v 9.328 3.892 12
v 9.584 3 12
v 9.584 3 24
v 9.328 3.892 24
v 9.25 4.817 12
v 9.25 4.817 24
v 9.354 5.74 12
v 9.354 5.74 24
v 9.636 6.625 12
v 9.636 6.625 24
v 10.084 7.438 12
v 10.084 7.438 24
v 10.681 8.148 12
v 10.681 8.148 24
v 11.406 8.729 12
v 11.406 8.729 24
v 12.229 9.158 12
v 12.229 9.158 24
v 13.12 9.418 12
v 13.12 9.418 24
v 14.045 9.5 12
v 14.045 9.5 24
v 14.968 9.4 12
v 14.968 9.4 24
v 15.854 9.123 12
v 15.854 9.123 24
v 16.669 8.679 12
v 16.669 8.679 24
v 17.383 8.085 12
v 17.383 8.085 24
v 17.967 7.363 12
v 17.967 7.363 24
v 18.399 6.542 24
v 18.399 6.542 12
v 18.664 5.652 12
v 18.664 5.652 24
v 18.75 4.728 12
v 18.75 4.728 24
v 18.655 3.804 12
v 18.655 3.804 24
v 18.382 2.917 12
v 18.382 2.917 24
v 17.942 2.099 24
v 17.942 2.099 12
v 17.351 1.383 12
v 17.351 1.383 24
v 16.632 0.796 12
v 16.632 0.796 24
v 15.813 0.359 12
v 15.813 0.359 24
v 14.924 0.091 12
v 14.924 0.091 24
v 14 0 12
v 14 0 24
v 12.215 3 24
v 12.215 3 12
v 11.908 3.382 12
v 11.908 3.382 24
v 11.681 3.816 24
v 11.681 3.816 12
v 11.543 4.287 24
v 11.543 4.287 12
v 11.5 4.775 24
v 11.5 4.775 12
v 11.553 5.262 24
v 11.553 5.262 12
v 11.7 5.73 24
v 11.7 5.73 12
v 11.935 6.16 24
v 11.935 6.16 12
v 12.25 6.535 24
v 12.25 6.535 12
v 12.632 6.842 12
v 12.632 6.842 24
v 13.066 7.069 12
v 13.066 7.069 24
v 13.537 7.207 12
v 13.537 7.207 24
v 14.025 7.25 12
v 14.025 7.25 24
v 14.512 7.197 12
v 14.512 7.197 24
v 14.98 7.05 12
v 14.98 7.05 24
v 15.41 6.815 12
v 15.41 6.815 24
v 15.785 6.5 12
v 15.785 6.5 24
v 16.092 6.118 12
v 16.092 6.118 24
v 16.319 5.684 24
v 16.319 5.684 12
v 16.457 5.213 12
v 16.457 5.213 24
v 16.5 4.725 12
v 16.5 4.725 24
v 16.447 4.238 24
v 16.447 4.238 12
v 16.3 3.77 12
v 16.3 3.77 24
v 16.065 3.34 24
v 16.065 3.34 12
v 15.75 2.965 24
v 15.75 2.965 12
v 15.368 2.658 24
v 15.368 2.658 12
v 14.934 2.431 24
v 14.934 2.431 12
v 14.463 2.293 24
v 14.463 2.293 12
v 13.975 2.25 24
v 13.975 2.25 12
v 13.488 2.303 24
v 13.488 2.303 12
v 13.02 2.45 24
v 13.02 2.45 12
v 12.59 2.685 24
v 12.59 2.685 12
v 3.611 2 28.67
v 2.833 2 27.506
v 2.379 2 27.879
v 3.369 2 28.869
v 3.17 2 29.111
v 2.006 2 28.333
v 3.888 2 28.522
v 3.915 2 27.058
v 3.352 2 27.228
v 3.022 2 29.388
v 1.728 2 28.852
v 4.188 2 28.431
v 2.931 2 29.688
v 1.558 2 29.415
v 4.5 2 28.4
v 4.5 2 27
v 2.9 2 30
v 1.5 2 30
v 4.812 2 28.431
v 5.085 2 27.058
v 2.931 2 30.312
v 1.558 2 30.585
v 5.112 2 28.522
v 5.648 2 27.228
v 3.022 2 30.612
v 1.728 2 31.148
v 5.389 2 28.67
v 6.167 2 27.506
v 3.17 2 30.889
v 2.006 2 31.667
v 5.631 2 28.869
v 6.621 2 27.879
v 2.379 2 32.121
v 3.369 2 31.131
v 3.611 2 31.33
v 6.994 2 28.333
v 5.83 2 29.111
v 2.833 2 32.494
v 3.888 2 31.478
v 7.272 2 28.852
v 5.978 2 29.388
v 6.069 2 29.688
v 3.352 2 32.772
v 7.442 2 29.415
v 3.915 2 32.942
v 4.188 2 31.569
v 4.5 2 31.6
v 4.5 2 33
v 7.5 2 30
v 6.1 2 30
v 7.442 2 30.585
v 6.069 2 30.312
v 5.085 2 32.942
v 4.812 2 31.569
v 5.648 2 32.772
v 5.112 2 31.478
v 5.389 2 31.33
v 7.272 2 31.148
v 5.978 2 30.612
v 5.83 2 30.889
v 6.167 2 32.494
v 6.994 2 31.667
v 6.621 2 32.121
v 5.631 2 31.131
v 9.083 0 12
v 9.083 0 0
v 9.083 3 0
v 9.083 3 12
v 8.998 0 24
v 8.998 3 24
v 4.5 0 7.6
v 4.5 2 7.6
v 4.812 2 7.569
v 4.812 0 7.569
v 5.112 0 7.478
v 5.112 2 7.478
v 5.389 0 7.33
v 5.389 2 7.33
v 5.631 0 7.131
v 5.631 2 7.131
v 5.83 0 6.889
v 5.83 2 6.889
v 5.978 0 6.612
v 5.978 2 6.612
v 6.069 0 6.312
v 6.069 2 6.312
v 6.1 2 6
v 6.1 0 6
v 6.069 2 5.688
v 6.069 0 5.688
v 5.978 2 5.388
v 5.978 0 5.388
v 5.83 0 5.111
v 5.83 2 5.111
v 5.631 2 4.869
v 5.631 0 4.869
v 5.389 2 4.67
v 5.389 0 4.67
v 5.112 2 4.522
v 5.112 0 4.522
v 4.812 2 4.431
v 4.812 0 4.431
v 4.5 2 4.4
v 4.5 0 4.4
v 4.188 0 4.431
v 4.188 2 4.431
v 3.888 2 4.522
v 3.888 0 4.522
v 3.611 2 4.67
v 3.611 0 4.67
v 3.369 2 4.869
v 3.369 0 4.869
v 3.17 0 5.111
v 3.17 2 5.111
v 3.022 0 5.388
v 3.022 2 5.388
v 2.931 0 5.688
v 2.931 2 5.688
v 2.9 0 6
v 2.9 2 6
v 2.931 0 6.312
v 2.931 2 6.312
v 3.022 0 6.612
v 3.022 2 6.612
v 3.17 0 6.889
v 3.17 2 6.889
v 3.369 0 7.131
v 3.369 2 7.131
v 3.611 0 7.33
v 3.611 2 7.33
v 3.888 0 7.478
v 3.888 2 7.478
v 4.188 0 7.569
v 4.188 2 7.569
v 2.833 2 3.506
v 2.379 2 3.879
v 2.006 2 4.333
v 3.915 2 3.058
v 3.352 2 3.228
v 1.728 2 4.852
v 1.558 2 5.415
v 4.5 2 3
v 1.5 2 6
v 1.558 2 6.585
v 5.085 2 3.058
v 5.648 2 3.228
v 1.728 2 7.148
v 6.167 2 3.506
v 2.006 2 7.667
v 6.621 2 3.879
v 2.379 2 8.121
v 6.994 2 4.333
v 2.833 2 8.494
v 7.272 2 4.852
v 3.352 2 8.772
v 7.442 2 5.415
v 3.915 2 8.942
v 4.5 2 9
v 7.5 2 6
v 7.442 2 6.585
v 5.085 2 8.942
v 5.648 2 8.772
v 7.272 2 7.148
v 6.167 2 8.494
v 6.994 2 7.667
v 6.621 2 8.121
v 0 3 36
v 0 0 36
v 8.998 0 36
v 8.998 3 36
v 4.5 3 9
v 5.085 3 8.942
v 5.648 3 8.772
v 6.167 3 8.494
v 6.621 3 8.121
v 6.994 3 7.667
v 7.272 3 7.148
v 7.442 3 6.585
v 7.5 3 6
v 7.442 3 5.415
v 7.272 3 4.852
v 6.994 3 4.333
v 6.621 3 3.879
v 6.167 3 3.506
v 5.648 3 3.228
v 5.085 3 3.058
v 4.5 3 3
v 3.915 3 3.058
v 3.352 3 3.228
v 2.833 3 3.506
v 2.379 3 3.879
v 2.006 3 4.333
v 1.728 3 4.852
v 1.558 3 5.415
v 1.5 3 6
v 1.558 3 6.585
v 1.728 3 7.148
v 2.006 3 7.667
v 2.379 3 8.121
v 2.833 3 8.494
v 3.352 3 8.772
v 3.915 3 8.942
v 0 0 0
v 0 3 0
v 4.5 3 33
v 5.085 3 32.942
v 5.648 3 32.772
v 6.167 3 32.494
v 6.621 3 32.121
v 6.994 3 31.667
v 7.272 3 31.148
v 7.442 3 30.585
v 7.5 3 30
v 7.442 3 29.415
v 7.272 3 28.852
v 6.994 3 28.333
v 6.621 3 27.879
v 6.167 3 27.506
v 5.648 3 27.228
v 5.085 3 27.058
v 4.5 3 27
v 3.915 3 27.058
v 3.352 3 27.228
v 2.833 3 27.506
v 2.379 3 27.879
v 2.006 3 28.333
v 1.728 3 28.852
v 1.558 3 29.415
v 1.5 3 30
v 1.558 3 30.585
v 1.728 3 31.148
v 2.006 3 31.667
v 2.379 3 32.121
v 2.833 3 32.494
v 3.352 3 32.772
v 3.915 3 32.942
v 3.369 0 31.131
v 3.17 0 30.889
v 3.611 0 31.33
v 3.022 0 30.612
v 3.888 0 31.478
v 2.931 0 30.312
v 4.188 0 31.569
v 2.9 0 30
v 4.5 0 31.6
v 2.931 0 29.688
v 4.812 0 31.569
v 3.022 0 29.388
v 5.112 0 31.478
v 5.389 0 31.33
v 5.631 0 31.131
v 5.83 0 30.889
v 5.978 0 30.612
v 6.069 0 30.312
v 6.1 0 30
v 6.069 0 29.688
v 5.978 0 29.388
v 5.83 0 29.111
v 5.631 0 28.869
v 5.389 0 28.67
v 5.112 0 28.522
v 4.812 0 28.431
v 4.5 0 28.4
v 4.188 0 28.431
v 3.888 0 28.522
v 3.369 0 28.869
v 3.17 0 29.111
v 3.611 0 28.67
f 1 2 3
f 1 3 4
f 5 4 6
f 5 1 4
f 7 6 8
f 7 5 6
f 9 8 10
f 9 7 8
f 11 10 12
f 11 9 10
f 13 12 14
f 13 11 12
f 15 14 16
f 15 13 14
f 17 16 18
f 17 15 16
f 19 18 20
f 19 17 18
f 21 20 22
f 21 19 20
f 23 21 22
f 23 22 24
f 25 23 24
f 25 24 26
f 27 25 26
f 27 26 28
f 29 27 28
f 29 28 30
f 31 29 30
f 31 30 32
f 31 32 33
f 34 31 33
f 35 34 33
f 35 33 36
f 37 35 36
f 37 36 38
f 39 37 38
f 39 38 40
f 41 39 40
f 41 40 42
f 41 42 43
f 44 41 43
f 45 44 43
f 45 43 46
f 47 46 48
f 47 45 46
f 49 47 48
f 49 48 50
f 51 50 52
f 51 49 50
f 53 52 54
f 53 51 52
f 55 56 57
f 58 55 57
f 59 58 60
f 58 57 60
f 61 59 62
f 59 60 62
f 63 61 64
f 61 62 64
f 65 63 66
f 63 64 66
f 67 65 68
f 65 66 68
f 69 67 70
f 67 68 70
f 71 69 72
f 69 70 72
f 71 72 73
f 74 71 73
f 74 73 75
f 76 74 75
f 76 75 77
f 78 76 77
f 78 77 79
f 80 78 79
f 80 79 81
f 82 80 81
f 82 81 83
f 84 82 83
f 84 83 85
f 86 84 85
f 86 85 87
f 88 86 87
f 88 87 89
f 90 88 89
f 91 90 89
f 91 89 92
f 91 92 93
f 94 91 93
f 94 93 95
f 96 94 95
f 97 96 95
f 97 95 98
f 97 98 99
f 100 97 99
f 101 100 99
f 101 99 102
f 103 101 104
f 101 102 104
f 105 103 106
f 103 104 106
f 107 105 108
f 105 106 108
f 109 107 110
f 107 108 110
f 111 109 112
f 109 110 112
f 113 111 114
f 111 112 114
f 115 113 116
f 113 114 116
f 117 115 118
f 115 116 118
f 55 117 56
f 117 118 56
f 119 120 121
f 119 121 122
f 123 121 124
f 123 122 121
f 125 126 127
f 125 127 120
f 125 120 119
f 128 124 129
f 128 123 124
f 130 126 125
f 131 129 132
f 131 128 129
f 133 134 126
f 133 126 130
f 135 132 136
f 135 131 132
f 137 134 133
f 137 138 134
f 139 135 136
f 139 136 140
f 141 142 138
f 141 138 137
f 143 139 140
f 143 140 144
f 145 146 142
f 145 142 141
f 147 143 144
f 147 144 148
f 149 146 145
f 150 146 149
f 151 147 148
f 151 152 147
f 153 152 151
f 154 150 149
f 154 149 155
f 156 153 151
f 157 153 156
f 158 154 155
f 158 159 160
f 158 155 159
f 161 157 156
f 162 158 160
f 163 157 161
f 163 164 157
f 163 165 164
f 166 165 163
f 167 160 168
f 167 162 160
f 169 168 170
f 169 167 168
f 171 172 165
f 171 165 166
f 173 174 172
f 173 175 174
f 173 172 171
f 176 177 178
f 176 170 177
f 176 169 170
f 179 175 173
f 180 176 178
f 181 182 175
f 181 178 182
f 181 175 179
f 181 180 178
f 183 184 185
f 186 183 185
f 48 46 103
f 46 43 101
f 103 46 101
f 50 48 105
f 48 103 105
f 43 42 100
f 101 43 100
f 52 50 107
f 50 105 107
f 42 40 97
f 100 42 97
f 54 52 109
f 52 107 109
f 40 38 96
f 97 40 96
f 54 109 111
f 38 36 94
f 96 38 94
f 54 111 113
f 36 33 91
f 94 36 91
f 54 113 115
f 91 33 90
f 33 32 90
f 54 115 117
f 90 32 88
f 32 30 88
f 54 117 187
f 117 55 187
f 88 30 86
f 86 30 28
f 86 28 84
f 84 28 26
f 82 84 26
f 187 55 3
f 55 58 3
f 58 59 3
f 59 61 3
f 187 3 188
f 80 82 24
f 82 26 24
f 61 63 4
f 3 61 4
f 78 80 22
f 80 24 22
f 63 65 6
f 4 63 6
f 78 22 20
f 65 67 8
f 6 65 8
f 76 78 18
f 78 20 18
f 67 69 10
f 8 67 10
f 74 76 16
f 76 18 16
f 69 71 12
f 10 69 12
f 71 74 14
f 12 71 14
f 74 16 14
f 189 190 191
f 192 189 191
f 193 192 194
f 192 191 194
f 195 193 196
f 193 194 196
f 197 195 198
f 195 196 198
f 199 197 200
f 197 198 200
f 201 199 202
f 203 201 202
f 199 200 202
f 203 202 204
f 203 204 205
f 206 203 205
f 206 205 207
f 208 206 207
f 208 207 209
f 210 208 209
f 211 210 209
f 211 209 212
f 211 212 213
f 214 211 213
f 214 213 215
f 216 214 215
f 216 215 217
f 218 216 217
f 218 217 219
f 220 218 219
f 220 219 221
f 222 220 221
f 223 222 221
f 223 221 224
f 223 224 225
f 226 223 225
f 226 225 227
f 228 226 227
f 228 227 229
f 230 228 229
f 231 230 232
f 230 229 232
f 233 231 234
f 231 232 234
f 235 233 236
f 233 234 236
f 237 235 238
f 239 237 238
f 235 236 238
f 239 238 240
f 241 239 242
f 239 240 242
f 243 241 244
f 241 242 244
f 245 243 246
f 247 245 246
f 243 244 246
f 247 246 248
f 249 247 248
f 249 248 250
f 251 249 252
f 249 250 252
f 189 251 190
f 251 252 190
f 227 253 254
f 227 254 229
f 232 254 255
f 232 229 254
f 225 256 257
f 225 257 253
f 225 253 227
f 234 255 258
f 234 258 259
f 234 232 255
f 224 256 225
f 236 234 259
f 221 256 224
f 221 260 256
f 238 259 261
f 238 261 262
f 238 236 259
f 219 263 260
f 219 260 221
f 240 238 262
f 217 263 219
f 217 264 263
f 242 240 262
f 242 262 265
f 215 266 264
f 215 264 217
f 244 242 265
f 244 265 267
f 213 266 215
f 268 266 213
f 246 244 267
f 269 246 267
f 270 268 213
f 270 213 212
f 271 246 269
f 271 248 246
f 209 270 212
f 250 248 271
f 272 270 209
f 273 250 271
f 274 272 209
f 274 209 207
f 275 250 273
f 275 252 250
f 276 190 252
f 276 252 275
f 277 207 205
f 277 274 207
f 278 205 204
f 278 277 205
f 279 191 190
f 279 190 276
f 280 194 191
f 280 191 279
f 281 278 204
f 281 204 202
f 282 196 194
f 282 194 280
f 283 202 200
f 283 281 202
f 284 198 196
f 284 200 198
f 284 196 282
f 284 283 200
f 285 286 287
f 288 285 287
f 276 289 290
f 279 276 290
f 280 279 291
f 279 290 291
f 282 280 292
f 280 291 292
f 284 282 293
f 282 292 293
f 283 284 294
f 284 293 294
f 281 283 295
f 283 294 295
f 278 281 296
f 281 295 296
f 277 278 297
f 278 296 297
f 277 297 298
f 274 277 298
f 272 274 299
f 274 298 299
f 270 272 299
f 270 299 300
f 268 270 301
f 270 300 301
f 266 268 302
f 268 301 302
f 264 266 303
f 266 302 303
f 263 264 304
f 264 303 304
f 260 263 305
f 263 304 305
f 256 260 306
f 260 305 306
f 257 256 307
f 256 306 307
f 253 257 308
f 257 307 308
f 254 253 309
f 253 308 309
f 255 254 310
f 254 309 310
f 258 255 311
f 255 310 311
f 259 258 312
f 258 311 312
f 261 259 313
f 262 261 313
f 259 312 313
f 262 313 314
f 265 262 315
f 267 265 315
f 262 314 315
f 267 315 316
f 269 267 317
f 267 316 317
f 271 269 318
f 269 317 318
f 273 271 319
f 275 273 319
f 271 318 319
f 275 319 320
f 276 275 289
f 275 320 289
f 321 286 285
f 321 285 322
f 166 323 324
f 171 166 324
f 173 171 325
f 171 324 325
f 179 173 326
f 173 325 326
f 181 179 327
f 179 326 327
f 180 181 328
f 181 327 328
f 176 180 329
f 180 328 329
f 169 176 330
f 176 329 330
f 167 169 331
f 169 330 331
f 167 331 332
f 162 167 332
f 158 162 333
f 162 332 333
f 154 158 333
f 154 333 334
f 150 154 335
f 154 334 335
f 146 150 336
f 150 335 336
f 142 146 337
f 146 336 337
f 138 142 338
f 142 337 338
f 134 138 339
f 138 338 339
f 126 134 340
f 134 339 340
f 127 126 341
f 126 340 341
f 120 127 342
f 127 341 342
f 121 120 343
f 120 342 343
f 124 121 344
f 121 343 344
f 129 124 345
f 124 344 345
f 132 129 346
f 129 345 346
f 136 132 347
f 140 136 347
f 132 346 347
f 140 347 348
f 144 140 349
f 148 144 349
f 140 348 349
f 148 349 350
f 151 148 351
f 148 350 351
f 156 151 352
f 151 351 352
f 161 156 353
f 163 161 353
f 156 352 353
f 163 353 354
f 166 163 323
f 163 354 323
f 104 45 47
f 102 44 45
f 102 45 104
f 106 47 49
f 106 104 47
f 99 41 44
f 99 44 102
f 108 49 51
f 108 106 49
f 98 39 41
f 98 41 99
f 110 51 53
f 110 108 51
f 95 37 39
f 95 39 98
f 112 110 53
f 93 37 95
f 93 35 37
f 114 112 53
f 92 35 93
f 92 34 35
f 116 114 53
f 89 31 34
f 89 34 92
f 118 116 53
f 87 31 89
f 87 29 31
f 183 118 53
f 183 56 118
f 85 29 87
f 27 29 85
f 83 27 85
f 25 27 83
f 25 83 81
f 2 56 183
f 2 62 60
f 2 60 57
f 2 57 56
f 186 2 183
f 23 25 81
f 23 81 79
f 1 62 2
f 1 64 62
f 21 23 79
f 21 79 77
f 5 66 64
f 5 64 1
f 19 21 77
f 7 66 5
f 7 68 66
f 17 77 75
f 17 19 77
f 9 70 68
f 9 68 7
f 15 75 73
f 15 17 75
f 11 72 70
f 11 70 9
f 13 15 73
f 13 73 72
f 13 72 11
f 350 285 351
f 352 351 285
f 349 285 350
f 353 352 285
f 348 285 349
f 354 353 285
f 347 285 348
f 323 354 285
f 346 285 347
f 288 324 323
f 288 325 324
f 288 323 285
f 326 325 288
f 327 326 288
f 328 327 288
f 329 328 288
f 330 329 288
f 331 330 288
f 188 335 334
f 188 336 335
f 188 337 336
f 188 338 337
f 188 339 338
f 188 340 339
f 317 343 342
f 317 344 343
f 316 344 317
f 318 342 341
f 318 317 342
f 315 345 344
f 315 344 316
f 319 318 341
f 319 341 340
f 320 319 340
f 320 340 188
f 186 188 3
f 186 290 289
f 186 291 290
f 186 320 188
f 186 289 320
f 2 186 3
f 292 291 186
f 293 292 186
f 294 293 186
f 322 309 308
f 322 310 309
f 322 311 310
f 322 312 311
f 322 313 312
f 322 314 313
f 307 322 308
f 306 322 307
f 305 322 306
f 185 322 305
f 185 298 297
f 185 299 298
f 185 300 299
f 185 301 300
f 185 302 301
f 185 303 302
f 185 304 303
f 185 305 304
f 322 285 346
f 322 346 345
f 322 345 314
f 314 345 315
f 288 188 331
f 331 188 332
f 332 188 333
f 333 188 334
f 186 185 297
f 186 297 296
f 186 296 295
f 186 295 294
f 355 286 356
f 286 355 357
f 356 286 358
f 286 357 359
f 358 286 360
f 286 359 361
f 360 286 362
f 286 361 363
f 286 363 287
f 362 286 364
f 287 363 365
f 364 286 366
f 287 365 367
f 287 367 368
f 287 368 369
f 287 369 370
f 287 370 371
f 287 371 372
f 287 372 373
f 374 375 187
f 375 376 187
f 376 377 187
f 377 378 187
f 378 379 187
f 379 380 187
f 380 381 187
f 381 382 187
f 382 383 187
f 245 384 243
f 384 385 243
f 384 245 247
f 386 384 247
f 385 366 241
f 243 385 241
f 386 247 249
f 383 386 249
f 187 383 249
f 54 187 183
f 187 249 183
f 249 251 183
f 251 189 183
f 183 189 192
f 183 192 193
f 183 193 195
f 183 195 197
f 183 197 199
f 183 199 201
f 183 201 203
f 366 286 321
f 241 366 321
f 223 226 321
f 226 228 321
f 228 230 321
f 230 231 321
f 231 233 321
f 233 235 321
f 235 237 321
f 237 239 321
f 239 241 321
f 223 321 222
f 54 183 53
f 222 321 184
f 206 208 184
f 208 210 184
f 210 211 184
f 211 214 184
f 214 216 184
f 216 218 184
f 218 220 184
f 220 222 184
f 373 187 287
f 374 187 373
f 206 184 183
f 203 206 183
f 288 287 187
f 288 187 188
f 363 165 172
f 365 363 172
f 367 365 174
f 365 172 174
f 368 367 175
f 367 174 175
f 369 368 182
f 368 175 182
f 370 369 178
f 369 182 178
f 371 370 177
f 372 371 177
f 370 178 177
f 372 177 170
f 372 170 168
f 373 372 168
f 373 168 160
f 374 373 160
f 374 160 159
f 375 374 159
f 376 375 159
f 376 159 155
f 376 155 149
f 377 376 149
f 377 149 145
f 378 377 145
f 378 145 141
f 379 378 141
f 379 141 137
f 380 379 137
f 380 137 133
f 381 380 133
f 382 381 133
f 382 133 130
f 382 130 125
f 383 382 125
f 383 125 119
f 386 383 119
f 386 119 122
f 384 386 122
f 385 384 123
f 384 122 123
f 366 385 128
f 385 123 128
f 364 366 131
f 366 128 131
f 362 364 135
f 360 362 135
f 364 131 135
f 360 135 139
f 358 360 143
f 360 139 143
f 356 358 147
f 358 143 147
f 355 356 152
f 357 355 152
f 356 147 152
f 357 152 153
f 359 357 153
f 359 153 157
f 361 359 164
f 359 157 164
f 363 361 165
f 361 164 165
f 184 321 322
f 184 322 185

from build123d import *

# Parameters (mm, degrees)
SKETCH_1_W          = 14
SKETCH_1_H          = 36
EXTRUDE_1_DEPTH     = 3
SKETCH_6_R          = 1.6
CUT_EXTRUDE_3_DEPTH = 10
SKETCH_7_R          = 3
CUT_EXTRUDE_4_DEPTH = 1
SKETCH_9_R          = 4.75
EXTRUDE_2_DEPTH     = 12
SKETCH_10_R         = 2.5
CUT_EXTRUDE_5_DEPTH = 12
SKETCH_11_W         = 10.773254888
SKETCH_11_H         = 9.942175225
CUT_EXTRUDE_7_DEPTH = 12
SKETCH_12_W         = 10.083050504
SKETCH_12_H         = 5.143061972
CUT_EXTRUDE_8_DEPTH = 12


with BuildPart() as part:
    # 草图1 → 凸台-拉伸1 (new body)
    with BuildSketch(Plane(origin=(0, 0, 0), x_dir=(1, 0, 0), z_dir=(0, 1, 0))):
        with Locations((7, -18)):
            Rectangle(SKETCH_1_W, SKETCH_1_H)
    extrude(amount=EXTRUDE_1_DEPTH)

    # 草图6 → 切除-拉伸3 (cut)
    with BuildSketch(Plane(origin=(0, 3, 0), x_dir=(1, 0, 0), z_dir=(0, 1, 0))):
        with Locations(Location((4.5, -6, 0), (0, 0, 270))):
            Circle(SKETCH_6_R)
        with Locations(Location((4.5, -30, 0), (0, 0, 270))):
            Circle(SKETCH_6_R)
    extrude(amount=-CUT_EXTRUDE_3_DEPTH, mode=Mode.SUBTRACT)

    # 草图7 → 切除-拉伸4 (cut)
    with BuildSketch(Plane(origin=(0, 3, 0), x_dir=(1, 0, 0), z_dir=(0, 1, 0))):
        with Locations(Location((4.5, -6, 0), (0, 0, 270))):
            Circle(SKETCH_7_R)
        with Locations(Location((4.5, -30, 0), (0, 0, 270))):
            Circle(SKETCH_7_R)
    extrude(amount=-CUT_EXTRUDE_4_DEPTH, mode=Mode.SUBTRACT)

    # 草图9 → 凸台-拉伸2 (add)
    with BuildSketch(Plane(origin=(0, 0, 12), x_dir=(-1, 0, 0), z_dir=(0, 0, -1))):
        with Locations((-14, 4.75)):
            Circle(SKETCH_9_R)
    extrude(amount=-EXTRUDE_2_DEPTH)

    # 草图10 → 切除-拉伸5 (cut)
    with BuildSketch(Plane(origin=(0, 0, 12), x_dir=(-1, 0, 0), z_dir=(0, 0, -1))):
        with Locations(Location((-14, 4.75, 0), (0, 0, 315.572995999))):
            Circle(SKETCH_10_R)
    extrude(amount=-CUT_EXTRUDE_5_DEPTH, mode=Mode.SUBTRACT)

    # 草图11 → 切除-拉伸7 (cut)
    with BuildSketch(Plane(origin=(0, 0, 0), x_dir=(-1, 0, 0), z_dir=(0, 0, -1))):
        with Locations((-14.469441618, 3.035843785)):
            Rectangle(SKETCH_11_W, SKETCH_11_H)
    extrude(amount=-CUT_EXTRUDE_7_DEPTH, mode=Mode.SUBTRACT)

    # 草图12 → 切除-拉伸8 (cut)
    with BuildSketch(Plane.XY.offset(36)):
        with Locations((14.039079275, 2.038040722)):
            Rectangle(SKETCH_12_W, SKETCH_12_H)
    extrude(amount=-CUT_EXTRUDE_8_DEPTH, mode=Mode.SUBTRACT)


solid = part.part
